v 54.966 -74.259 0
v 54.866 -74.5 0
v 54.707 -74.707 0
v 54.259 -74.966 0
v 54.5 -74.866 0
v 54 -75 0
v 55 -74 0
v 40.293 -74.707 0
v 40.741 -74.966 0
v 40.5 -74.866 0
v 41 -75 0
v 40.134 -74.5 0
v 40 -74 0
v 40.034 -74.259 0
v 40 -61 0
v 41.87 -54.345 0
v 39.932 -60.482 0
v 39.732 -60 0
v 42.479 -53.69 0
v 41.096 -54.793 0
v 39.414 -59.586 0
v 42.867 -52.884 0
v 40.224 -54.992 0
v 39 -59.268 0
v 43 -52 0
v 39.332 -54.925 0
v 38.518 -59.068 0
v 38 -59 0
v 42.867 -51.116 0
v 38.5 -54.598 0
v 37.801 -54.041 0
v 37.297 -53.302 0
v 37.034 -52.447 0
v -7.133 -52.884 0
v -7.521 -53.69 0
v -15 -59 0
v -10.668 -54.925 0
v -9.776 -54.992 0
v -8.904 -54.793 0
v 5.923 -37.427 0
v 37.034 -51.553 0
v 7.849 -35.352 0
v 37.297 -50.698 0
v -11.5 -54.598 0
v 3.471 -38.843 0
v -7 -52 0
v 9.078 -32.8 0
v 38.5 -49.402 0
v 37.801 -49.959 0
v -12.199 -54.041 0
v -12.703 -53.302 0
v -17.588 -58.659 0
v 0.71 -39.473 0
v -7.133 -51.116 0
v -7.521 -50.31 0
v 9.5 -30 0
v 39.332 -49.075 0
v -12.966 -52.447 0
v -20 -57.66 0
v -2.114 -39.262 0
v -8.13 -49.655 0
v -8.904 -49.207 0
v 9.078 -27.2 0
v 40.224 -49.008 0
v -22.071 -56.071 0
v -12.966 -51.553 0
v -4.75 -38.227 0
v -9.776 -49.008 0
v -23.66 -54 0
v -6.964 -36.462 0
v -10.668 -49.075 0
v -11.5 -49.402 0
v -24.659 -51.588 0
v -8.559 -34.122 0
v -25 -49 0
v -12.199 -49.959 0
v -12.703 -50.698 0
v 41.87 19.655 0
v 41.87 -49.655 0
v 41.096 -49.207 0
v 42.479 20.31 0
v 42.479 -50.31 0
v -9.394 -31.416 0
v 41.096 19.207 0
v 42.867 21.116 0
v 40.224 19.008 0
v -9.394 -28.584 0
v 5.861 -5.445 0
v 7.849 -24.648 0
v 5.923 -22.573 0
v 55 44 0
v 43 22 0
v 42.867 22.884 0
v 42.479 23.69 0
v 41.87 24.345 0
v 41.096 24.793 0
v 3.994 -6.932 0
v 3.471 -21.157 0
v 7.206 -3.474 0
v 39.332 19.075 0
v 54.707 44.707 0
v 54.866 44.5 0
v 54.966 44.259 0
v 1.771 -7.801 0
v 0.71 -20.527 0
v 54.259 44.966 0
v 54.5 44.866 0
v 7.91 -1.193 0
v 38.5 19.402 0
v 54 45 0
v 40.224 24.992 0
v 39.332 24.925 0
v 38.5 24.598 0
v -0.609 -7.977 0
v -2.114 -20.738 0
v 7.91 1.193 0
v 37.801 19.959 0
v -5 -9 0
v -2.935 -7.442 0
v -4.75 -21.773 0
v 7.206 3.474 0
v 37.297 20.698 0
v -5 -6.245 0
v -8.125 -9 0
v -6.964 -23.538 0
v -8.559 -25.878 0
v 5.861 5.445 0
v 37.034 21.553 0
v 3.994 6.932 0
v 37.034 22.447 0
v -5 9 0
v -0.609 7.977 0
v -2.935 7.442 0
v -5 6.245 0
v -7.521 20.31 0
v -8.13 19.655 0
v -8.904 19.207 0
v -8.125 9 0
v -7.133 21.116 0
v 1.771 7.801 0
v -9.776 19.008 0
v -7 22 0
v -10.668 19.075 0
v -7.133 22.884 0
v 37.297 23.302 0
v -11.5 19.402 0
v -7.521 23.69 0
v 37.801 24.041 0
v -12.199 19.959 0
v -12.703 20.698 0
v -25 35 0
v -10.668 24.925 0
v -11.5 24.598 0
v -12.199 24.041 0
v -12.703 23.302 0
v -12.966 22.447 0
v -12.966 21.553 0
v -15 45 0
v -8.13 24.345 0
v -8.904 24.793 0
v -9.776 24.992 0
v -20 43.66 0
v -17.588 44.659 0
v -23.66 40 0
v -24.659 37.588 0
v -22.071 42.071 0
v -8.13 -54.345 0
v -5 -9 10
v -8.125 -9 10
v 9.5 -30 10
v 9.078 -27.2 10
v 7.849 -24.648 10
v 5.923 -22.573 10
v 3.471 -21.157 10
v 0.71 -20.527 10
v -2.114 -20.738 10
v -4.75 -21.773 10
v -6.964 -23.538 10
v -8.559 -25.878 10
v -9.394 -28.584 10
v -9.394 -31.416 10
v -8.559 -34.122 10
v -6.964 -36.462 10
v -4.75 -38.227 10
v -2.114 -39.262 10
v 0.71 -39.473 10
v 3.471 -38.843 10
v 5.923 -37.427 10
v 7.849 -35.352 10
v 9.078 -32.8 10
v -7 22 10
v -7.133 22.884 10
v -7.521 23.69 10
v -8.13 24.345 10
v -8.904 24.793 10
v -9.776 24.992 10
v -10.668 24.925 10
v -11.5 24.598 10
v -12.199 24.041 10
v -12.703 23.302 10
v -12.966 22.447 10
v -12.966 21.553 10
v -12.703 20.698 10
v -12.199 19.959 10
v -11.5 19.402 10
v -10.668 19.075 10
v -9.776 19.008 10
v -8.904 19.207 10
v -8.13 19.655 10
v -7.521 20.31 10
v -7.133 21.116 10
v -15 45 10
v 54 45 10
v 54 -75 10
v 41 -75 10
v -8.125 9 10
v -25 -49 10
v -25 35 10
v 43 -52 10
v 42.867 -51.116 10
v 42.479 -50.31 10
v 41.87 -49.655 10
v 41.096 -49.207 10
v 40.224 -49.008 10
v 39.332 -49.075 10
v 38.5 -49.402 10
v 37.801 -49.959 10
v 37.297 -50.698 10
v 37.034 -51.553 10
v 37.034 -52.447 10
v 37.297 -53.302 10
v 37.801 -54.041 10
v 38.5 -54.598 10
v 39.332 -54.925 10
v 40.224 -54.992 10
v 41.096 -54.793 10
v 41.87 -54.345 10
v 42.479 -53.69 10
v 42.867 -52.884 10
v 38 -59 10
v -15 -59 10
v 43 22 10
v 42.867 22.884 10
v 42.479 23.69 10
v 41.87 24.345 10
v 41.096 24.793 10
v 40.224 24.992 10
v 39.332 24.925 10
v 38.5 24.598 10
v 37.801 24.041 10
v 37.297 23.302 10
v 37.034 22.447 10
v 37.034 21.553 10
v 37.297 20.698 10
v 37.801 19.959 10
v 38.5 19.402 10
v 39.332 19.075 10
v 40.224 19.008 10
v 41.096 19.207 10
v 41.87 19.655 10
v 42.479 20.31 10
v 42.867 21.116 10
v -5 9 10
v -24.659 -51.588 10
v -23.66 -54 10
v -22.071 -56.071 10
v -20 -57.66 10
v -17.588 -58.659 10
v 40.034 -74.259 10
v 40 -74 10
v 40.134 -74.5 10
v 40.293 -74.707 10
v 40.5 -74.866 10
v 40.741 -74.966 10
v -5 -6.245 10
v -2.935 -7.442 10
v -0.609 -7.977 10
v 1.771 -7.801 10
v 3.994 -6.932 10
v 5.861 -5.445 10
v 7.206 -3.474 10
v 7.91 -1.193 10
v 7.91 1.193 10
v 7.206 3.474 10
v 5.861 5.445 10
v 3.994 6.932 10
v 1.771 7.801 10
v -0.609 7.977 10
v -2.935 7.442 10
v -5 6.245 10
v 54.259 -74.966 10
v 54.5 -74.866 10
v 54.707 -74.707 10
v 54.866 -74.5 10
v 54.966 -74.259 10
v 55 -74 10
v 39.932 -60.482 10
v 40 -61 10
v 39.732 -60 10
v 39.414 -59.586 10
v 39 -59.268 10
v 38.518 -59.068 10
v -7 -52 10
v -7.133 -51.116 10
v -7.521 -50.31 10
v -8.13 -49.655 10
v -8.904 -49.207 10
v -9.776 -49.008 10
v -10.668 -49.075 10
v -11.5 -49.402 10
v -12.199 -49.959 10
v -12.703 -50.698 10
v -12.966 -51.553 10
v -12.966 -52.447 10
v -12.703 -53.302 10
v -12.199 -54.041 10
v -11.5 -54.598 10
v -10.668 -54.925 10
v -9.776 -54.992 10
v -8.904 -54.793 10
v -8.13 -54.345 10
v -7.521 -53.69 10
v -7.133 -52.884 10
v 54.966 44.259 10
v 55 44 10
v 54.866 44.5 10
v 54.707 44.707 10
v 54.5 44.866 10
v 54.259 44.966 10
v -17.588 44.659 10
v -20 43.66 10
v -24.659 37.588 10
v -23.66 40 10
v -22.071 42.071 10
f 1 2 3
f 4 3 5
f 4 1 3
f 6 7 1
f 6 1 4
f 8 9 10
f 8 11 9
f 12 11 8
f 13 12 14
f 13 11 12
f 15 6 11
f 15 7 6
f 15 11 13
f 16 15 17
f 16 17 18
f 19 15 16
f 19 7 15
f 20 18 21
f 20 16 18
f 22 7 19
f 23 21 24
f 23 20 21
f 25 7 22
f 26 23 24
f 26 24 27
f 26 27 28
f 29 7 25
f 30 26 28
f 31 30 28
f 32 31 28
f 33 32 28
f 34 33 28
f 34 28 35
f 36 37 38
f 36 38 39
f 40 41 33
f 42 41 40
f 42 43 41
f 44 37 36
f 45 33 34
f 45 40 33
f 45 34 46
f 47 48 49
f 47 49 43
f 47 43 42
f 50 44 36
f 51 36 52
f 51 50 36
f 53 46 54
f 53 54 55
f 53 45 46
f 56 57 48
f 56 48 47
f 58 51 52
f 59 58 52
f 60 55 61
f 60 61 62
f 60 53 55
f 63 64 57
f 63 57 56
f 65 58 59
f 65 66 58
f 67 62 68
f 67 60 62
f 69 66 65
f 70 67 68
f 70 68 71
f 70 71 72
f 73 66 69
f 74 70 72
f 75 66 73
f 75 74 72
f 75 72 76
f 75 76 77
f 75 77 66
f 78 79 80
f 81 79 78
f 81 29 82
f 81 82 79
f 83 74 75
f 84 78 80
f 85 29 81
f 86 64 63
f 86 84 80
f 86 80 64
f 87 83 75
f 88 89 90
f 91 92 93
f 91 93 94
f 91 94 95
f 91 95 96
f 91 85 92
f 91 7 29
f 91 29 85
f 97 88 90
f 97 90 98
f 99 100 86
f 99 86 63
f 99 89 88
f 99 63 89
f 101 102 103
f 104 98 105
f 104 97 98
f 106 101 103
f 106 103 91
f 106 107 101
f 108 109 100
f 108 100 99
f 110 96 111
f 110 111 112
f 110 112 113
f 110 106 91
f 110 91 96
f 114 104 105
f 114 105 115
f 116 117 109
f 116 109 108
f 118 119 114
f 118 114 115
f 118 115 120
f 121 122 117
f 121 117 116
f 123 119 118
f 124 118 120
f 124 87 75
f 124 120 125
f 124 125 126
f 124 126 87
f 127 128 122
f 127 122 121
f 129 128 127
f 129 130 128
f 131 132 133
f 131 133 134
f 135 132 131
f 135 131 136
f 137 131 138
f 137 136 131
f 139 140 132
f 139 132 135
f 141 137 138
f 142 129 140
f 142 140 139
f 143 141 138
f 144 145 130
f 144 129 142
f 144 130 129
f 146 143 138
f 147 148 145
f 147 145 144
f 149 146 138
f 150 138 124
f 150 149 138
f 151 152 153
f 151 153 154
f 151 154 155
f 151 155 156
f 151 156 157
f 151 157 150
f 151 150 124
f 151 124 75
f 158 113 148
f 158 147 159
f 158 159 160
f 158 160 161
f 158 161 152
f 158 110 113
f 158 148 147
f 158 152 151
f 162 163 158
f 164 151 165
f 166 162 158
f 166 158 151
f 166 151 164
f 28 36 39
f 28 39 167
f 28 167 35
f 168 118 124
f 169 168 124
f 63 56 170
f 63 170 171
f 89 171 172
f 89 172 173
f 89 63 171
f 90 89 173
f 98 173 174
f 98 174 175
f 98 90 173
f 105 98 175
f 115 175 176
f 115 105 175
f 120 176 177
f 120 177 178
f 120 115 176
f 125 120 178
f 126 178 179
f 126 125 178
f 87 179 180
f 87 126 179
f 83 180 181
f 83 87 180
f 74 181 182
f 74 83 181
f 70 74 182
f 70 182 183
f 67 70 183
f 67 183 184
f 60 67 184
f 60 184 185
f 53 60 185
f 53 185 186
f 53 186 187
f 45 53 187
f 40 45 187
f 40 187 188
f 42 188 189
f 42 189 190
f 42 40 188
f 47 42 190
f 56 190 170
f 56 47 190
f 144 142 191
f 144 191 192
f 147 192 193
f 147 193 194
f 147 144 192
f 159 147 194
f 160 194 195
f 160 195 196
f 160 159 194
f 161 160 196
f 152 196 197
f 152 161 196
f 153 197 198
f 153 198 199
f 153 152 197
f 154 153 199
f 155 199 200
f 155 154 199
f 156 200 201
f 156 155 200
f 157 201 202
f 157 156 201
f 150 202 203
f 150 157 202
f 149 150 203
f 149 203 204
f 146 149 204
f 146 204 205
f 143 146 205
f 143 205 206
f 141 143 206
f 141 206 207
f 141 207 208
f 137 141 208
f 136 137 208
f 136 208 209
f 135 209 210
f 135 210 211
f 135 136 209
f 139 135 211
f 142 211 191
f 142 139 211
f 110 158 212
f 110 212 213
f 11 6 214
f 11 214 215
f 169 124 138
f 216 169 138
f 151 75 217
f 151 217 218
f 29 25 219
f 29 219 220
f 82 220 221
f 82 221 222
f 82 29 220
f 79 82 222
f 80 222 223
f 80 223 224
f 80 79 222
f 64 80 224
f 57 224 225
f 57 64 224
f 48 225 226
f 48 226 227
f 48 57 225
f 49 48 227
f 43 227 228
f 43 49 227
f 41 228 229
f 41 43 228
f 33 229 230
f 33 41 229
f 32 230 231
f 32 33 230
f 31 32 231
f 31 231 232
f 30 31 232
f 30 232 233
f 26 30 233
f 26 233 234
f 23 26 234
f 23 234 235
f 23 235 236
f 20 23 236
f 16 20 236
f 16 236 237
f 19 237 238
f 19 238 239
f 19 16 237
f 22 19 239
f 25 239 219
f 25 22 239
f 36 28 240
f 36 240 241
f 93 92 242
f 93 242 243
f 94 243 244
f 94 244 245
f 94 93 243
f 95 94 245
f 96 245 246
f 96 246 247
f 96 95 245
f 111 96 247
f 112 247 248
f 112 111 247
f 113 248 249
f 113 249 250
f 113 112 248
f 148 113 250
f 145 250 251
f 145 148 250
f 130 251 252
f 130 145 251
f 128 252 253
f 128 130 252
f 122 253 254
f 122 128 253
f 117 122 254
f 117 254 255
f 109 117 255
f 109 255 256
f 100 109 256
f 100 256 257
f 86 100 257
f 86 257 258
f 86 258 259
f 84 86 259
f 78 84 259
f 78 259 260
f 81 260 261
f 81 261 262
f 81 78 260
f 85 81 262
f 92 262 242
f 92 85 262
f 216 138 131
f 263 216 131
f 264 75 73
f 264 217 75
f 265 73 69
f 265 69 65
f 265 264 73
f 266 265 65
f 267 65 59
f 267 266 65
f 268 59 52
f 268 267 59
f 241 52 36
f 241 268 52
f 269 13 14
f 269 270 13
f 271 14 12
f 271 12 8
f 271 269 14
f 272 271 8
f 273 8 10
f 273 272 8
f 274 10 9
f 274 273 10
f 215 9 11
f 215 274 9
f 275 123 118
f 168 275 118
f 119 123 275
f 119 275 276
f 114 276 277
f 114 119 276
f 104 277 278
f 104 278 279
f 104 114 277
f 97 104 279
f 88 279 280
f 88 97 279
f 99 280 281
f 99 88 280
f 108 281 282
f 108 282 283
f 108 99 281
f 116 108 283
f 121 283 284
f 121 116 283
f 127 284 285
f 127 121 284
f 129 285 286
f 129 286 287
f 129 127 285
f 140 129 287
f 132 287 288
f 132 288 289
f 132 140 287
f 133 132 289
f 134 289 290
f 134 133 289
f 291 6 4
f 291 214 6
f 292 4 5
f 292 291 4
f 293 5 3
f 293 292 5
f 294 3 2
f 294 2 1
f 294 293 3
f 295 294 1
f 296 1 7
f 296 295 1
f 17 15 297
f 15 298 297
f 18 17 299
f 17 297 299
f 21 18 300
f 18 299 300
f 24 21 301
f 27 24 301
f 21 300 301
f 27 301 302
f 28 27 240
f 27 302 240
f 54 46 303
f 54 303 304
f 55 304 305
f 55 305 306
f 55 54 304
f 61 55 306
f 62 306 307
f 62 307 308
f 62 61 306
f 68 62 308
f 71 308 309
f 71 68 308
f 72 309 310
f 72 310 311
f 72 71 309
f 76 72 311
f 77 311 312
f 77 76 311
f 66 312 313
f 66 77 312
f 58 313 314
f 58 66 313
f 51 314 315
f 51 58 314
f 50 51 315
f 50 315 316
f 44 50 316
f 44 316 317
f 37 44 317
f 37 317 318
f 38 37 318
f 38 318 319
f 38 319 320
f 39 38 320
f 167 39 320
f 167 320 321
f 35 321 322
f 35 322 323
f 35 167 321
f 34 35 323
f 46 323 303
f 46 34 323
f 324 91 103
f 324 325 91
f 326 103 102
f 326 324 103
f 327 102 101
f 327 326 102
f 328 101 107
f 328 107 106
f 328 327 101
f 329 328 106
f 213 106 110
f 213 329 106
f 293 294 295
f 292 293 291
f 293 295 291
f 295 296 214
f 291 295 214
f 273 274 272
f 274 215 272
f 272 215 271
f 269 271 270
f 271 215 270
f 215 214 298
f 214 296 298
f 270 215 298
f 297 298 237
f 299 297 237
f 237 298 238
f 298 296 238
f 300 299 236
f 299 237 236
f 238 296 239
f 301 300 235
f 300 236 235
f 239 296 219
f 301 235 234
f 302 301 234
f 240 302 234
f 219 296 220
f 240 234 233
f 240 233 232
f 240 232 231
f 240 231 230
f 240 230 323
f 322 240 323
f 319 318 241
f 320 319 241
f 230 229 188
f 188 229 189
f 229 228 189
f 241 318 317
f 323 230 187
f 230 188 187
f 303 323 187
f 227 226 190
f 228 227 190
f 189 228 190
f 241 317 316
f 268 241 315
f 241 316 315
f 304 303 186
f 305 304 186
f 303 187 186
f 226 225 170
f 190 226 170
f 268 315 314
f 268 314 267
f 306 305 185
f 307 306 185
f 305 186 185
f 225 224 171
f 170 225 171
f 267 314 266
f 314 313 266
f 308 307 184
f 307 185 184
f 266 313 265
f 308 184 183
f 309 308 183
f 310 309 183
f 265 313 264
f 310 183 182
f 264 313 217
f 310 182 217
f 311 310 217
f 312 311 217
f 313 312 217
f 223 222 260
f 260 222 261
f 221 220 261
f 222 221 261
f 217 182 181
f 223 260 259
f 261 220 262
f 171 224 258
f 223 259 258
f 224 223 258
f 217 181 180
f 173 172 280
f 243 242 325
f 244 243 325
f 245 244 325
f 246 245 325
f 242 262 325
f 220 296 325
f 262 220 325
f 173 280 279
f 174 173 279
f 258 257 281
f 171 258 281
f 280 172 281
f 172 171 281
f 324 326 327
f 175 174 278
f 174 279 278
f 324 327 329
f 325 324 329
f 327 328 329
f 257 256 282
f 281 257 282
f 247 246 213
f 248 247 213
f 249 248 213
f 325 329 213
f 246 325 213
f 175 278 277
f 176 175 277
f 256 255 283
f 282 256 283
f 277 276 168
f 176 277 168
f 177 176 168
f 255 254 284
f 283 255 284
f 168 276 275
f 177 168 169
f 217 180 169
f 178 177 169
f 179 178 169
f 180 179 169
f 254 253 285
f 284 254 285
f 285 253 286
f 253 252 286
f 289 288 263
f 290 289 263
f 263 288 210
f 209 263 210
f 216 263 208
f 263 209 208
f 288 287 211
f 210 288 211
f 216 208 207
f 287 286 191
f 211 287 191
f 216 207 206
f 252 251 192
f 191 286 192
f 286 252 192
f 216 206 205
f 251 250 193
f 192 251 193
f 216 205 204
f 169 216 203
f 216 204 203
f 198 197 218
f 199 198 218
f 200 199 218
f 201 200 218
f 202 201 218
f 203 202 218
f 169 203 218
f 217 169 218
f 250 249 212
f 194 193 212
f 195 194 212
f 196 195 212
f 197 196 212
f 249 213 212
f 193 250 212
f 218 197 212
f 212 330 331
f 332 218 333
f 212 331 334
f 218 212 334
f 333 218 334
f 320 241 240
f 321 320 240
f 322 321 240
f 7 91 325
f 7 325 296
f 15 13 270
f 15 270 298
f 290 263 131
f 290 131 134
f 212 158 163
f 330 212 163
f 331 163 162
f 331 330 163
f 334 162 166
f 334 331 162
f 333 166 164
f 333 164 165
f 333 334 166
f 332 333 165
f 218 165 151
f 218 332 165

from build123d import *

# Parameters (mm, degrees)
SKETCH_R    = 9.5
SKETCH_R_2  = 3
PAD_DEPTH   = 10
FILLET_R    = 10
FILLET001_R = 2
FILLET002_R = 1


with BuildPart() as part:
    # Sketch → Pad (new body)
    with BuildSketch(Plane.XY):
        Polygon((-25, 45), (55, 45), (55, -75), (40, -75), (40, -59), (-25, -59), align=None)
        with Locations((0, -30)):
            Circle(SKETCH_R, mode=Mode.SUBTRACT)
        with Locations((-10, -52)):
            Circle(SKETCH_R_2, mode=Mode.SUBTRACT)
        with Locations((40, -52)):
            Circle(SKETCH_R_2, mode=Mode.SUBTRACT)
        with Locations((40, 22)):
            Circle(SKETCH_R_2, mode=Mode.SUBTRACT)
        with Locations((-10, 22)):
            Circle(SKETCH_R_2, mode=Mode.SUBTRACT)
        with BuildLine():
            ThreePointArc((-5, -6.244998), (8, 0), (-5, 6.244998))
            Line((-5, 9), (-5, 6.244998))
            Line((-8.125, 9), (-5, 9))
            Line((-8.125, -9), (-8.125, 9))
            Line((-5, -9), (-8.125, -9))
            Line((-5, -6.244998), (-5, -9))
        make_face(mode=Mode.SUBTRACT)
    extrude(amount=PAD_DEPTH)

    # Fillet
    fillet_edges = [part.edges().sort_by_distance(p)[0] for p in [
        (-25, 45, 5),
        (-25, -59, 5),
    ]]
    fillet(fillet_edges, radius=FILLET_R)

    # Fillet001
    fillet001_edges = [part.edges().sort_by_distance(p)[0] for p in [
        (40, -59, 5),
    ]]
    fillet(fillet001_edges, radius=FILLET001_R)

    # Fillet002
    fillet002_edges = [part.edges().sort_by_distance(p)[0] for p in [
        (40, -75, 5),
        (55, -75, 5),
        (55, 45, 5),
    ]]
    fillet(fillet002_edges, radius=FILLET002_R)


solid = part.part
